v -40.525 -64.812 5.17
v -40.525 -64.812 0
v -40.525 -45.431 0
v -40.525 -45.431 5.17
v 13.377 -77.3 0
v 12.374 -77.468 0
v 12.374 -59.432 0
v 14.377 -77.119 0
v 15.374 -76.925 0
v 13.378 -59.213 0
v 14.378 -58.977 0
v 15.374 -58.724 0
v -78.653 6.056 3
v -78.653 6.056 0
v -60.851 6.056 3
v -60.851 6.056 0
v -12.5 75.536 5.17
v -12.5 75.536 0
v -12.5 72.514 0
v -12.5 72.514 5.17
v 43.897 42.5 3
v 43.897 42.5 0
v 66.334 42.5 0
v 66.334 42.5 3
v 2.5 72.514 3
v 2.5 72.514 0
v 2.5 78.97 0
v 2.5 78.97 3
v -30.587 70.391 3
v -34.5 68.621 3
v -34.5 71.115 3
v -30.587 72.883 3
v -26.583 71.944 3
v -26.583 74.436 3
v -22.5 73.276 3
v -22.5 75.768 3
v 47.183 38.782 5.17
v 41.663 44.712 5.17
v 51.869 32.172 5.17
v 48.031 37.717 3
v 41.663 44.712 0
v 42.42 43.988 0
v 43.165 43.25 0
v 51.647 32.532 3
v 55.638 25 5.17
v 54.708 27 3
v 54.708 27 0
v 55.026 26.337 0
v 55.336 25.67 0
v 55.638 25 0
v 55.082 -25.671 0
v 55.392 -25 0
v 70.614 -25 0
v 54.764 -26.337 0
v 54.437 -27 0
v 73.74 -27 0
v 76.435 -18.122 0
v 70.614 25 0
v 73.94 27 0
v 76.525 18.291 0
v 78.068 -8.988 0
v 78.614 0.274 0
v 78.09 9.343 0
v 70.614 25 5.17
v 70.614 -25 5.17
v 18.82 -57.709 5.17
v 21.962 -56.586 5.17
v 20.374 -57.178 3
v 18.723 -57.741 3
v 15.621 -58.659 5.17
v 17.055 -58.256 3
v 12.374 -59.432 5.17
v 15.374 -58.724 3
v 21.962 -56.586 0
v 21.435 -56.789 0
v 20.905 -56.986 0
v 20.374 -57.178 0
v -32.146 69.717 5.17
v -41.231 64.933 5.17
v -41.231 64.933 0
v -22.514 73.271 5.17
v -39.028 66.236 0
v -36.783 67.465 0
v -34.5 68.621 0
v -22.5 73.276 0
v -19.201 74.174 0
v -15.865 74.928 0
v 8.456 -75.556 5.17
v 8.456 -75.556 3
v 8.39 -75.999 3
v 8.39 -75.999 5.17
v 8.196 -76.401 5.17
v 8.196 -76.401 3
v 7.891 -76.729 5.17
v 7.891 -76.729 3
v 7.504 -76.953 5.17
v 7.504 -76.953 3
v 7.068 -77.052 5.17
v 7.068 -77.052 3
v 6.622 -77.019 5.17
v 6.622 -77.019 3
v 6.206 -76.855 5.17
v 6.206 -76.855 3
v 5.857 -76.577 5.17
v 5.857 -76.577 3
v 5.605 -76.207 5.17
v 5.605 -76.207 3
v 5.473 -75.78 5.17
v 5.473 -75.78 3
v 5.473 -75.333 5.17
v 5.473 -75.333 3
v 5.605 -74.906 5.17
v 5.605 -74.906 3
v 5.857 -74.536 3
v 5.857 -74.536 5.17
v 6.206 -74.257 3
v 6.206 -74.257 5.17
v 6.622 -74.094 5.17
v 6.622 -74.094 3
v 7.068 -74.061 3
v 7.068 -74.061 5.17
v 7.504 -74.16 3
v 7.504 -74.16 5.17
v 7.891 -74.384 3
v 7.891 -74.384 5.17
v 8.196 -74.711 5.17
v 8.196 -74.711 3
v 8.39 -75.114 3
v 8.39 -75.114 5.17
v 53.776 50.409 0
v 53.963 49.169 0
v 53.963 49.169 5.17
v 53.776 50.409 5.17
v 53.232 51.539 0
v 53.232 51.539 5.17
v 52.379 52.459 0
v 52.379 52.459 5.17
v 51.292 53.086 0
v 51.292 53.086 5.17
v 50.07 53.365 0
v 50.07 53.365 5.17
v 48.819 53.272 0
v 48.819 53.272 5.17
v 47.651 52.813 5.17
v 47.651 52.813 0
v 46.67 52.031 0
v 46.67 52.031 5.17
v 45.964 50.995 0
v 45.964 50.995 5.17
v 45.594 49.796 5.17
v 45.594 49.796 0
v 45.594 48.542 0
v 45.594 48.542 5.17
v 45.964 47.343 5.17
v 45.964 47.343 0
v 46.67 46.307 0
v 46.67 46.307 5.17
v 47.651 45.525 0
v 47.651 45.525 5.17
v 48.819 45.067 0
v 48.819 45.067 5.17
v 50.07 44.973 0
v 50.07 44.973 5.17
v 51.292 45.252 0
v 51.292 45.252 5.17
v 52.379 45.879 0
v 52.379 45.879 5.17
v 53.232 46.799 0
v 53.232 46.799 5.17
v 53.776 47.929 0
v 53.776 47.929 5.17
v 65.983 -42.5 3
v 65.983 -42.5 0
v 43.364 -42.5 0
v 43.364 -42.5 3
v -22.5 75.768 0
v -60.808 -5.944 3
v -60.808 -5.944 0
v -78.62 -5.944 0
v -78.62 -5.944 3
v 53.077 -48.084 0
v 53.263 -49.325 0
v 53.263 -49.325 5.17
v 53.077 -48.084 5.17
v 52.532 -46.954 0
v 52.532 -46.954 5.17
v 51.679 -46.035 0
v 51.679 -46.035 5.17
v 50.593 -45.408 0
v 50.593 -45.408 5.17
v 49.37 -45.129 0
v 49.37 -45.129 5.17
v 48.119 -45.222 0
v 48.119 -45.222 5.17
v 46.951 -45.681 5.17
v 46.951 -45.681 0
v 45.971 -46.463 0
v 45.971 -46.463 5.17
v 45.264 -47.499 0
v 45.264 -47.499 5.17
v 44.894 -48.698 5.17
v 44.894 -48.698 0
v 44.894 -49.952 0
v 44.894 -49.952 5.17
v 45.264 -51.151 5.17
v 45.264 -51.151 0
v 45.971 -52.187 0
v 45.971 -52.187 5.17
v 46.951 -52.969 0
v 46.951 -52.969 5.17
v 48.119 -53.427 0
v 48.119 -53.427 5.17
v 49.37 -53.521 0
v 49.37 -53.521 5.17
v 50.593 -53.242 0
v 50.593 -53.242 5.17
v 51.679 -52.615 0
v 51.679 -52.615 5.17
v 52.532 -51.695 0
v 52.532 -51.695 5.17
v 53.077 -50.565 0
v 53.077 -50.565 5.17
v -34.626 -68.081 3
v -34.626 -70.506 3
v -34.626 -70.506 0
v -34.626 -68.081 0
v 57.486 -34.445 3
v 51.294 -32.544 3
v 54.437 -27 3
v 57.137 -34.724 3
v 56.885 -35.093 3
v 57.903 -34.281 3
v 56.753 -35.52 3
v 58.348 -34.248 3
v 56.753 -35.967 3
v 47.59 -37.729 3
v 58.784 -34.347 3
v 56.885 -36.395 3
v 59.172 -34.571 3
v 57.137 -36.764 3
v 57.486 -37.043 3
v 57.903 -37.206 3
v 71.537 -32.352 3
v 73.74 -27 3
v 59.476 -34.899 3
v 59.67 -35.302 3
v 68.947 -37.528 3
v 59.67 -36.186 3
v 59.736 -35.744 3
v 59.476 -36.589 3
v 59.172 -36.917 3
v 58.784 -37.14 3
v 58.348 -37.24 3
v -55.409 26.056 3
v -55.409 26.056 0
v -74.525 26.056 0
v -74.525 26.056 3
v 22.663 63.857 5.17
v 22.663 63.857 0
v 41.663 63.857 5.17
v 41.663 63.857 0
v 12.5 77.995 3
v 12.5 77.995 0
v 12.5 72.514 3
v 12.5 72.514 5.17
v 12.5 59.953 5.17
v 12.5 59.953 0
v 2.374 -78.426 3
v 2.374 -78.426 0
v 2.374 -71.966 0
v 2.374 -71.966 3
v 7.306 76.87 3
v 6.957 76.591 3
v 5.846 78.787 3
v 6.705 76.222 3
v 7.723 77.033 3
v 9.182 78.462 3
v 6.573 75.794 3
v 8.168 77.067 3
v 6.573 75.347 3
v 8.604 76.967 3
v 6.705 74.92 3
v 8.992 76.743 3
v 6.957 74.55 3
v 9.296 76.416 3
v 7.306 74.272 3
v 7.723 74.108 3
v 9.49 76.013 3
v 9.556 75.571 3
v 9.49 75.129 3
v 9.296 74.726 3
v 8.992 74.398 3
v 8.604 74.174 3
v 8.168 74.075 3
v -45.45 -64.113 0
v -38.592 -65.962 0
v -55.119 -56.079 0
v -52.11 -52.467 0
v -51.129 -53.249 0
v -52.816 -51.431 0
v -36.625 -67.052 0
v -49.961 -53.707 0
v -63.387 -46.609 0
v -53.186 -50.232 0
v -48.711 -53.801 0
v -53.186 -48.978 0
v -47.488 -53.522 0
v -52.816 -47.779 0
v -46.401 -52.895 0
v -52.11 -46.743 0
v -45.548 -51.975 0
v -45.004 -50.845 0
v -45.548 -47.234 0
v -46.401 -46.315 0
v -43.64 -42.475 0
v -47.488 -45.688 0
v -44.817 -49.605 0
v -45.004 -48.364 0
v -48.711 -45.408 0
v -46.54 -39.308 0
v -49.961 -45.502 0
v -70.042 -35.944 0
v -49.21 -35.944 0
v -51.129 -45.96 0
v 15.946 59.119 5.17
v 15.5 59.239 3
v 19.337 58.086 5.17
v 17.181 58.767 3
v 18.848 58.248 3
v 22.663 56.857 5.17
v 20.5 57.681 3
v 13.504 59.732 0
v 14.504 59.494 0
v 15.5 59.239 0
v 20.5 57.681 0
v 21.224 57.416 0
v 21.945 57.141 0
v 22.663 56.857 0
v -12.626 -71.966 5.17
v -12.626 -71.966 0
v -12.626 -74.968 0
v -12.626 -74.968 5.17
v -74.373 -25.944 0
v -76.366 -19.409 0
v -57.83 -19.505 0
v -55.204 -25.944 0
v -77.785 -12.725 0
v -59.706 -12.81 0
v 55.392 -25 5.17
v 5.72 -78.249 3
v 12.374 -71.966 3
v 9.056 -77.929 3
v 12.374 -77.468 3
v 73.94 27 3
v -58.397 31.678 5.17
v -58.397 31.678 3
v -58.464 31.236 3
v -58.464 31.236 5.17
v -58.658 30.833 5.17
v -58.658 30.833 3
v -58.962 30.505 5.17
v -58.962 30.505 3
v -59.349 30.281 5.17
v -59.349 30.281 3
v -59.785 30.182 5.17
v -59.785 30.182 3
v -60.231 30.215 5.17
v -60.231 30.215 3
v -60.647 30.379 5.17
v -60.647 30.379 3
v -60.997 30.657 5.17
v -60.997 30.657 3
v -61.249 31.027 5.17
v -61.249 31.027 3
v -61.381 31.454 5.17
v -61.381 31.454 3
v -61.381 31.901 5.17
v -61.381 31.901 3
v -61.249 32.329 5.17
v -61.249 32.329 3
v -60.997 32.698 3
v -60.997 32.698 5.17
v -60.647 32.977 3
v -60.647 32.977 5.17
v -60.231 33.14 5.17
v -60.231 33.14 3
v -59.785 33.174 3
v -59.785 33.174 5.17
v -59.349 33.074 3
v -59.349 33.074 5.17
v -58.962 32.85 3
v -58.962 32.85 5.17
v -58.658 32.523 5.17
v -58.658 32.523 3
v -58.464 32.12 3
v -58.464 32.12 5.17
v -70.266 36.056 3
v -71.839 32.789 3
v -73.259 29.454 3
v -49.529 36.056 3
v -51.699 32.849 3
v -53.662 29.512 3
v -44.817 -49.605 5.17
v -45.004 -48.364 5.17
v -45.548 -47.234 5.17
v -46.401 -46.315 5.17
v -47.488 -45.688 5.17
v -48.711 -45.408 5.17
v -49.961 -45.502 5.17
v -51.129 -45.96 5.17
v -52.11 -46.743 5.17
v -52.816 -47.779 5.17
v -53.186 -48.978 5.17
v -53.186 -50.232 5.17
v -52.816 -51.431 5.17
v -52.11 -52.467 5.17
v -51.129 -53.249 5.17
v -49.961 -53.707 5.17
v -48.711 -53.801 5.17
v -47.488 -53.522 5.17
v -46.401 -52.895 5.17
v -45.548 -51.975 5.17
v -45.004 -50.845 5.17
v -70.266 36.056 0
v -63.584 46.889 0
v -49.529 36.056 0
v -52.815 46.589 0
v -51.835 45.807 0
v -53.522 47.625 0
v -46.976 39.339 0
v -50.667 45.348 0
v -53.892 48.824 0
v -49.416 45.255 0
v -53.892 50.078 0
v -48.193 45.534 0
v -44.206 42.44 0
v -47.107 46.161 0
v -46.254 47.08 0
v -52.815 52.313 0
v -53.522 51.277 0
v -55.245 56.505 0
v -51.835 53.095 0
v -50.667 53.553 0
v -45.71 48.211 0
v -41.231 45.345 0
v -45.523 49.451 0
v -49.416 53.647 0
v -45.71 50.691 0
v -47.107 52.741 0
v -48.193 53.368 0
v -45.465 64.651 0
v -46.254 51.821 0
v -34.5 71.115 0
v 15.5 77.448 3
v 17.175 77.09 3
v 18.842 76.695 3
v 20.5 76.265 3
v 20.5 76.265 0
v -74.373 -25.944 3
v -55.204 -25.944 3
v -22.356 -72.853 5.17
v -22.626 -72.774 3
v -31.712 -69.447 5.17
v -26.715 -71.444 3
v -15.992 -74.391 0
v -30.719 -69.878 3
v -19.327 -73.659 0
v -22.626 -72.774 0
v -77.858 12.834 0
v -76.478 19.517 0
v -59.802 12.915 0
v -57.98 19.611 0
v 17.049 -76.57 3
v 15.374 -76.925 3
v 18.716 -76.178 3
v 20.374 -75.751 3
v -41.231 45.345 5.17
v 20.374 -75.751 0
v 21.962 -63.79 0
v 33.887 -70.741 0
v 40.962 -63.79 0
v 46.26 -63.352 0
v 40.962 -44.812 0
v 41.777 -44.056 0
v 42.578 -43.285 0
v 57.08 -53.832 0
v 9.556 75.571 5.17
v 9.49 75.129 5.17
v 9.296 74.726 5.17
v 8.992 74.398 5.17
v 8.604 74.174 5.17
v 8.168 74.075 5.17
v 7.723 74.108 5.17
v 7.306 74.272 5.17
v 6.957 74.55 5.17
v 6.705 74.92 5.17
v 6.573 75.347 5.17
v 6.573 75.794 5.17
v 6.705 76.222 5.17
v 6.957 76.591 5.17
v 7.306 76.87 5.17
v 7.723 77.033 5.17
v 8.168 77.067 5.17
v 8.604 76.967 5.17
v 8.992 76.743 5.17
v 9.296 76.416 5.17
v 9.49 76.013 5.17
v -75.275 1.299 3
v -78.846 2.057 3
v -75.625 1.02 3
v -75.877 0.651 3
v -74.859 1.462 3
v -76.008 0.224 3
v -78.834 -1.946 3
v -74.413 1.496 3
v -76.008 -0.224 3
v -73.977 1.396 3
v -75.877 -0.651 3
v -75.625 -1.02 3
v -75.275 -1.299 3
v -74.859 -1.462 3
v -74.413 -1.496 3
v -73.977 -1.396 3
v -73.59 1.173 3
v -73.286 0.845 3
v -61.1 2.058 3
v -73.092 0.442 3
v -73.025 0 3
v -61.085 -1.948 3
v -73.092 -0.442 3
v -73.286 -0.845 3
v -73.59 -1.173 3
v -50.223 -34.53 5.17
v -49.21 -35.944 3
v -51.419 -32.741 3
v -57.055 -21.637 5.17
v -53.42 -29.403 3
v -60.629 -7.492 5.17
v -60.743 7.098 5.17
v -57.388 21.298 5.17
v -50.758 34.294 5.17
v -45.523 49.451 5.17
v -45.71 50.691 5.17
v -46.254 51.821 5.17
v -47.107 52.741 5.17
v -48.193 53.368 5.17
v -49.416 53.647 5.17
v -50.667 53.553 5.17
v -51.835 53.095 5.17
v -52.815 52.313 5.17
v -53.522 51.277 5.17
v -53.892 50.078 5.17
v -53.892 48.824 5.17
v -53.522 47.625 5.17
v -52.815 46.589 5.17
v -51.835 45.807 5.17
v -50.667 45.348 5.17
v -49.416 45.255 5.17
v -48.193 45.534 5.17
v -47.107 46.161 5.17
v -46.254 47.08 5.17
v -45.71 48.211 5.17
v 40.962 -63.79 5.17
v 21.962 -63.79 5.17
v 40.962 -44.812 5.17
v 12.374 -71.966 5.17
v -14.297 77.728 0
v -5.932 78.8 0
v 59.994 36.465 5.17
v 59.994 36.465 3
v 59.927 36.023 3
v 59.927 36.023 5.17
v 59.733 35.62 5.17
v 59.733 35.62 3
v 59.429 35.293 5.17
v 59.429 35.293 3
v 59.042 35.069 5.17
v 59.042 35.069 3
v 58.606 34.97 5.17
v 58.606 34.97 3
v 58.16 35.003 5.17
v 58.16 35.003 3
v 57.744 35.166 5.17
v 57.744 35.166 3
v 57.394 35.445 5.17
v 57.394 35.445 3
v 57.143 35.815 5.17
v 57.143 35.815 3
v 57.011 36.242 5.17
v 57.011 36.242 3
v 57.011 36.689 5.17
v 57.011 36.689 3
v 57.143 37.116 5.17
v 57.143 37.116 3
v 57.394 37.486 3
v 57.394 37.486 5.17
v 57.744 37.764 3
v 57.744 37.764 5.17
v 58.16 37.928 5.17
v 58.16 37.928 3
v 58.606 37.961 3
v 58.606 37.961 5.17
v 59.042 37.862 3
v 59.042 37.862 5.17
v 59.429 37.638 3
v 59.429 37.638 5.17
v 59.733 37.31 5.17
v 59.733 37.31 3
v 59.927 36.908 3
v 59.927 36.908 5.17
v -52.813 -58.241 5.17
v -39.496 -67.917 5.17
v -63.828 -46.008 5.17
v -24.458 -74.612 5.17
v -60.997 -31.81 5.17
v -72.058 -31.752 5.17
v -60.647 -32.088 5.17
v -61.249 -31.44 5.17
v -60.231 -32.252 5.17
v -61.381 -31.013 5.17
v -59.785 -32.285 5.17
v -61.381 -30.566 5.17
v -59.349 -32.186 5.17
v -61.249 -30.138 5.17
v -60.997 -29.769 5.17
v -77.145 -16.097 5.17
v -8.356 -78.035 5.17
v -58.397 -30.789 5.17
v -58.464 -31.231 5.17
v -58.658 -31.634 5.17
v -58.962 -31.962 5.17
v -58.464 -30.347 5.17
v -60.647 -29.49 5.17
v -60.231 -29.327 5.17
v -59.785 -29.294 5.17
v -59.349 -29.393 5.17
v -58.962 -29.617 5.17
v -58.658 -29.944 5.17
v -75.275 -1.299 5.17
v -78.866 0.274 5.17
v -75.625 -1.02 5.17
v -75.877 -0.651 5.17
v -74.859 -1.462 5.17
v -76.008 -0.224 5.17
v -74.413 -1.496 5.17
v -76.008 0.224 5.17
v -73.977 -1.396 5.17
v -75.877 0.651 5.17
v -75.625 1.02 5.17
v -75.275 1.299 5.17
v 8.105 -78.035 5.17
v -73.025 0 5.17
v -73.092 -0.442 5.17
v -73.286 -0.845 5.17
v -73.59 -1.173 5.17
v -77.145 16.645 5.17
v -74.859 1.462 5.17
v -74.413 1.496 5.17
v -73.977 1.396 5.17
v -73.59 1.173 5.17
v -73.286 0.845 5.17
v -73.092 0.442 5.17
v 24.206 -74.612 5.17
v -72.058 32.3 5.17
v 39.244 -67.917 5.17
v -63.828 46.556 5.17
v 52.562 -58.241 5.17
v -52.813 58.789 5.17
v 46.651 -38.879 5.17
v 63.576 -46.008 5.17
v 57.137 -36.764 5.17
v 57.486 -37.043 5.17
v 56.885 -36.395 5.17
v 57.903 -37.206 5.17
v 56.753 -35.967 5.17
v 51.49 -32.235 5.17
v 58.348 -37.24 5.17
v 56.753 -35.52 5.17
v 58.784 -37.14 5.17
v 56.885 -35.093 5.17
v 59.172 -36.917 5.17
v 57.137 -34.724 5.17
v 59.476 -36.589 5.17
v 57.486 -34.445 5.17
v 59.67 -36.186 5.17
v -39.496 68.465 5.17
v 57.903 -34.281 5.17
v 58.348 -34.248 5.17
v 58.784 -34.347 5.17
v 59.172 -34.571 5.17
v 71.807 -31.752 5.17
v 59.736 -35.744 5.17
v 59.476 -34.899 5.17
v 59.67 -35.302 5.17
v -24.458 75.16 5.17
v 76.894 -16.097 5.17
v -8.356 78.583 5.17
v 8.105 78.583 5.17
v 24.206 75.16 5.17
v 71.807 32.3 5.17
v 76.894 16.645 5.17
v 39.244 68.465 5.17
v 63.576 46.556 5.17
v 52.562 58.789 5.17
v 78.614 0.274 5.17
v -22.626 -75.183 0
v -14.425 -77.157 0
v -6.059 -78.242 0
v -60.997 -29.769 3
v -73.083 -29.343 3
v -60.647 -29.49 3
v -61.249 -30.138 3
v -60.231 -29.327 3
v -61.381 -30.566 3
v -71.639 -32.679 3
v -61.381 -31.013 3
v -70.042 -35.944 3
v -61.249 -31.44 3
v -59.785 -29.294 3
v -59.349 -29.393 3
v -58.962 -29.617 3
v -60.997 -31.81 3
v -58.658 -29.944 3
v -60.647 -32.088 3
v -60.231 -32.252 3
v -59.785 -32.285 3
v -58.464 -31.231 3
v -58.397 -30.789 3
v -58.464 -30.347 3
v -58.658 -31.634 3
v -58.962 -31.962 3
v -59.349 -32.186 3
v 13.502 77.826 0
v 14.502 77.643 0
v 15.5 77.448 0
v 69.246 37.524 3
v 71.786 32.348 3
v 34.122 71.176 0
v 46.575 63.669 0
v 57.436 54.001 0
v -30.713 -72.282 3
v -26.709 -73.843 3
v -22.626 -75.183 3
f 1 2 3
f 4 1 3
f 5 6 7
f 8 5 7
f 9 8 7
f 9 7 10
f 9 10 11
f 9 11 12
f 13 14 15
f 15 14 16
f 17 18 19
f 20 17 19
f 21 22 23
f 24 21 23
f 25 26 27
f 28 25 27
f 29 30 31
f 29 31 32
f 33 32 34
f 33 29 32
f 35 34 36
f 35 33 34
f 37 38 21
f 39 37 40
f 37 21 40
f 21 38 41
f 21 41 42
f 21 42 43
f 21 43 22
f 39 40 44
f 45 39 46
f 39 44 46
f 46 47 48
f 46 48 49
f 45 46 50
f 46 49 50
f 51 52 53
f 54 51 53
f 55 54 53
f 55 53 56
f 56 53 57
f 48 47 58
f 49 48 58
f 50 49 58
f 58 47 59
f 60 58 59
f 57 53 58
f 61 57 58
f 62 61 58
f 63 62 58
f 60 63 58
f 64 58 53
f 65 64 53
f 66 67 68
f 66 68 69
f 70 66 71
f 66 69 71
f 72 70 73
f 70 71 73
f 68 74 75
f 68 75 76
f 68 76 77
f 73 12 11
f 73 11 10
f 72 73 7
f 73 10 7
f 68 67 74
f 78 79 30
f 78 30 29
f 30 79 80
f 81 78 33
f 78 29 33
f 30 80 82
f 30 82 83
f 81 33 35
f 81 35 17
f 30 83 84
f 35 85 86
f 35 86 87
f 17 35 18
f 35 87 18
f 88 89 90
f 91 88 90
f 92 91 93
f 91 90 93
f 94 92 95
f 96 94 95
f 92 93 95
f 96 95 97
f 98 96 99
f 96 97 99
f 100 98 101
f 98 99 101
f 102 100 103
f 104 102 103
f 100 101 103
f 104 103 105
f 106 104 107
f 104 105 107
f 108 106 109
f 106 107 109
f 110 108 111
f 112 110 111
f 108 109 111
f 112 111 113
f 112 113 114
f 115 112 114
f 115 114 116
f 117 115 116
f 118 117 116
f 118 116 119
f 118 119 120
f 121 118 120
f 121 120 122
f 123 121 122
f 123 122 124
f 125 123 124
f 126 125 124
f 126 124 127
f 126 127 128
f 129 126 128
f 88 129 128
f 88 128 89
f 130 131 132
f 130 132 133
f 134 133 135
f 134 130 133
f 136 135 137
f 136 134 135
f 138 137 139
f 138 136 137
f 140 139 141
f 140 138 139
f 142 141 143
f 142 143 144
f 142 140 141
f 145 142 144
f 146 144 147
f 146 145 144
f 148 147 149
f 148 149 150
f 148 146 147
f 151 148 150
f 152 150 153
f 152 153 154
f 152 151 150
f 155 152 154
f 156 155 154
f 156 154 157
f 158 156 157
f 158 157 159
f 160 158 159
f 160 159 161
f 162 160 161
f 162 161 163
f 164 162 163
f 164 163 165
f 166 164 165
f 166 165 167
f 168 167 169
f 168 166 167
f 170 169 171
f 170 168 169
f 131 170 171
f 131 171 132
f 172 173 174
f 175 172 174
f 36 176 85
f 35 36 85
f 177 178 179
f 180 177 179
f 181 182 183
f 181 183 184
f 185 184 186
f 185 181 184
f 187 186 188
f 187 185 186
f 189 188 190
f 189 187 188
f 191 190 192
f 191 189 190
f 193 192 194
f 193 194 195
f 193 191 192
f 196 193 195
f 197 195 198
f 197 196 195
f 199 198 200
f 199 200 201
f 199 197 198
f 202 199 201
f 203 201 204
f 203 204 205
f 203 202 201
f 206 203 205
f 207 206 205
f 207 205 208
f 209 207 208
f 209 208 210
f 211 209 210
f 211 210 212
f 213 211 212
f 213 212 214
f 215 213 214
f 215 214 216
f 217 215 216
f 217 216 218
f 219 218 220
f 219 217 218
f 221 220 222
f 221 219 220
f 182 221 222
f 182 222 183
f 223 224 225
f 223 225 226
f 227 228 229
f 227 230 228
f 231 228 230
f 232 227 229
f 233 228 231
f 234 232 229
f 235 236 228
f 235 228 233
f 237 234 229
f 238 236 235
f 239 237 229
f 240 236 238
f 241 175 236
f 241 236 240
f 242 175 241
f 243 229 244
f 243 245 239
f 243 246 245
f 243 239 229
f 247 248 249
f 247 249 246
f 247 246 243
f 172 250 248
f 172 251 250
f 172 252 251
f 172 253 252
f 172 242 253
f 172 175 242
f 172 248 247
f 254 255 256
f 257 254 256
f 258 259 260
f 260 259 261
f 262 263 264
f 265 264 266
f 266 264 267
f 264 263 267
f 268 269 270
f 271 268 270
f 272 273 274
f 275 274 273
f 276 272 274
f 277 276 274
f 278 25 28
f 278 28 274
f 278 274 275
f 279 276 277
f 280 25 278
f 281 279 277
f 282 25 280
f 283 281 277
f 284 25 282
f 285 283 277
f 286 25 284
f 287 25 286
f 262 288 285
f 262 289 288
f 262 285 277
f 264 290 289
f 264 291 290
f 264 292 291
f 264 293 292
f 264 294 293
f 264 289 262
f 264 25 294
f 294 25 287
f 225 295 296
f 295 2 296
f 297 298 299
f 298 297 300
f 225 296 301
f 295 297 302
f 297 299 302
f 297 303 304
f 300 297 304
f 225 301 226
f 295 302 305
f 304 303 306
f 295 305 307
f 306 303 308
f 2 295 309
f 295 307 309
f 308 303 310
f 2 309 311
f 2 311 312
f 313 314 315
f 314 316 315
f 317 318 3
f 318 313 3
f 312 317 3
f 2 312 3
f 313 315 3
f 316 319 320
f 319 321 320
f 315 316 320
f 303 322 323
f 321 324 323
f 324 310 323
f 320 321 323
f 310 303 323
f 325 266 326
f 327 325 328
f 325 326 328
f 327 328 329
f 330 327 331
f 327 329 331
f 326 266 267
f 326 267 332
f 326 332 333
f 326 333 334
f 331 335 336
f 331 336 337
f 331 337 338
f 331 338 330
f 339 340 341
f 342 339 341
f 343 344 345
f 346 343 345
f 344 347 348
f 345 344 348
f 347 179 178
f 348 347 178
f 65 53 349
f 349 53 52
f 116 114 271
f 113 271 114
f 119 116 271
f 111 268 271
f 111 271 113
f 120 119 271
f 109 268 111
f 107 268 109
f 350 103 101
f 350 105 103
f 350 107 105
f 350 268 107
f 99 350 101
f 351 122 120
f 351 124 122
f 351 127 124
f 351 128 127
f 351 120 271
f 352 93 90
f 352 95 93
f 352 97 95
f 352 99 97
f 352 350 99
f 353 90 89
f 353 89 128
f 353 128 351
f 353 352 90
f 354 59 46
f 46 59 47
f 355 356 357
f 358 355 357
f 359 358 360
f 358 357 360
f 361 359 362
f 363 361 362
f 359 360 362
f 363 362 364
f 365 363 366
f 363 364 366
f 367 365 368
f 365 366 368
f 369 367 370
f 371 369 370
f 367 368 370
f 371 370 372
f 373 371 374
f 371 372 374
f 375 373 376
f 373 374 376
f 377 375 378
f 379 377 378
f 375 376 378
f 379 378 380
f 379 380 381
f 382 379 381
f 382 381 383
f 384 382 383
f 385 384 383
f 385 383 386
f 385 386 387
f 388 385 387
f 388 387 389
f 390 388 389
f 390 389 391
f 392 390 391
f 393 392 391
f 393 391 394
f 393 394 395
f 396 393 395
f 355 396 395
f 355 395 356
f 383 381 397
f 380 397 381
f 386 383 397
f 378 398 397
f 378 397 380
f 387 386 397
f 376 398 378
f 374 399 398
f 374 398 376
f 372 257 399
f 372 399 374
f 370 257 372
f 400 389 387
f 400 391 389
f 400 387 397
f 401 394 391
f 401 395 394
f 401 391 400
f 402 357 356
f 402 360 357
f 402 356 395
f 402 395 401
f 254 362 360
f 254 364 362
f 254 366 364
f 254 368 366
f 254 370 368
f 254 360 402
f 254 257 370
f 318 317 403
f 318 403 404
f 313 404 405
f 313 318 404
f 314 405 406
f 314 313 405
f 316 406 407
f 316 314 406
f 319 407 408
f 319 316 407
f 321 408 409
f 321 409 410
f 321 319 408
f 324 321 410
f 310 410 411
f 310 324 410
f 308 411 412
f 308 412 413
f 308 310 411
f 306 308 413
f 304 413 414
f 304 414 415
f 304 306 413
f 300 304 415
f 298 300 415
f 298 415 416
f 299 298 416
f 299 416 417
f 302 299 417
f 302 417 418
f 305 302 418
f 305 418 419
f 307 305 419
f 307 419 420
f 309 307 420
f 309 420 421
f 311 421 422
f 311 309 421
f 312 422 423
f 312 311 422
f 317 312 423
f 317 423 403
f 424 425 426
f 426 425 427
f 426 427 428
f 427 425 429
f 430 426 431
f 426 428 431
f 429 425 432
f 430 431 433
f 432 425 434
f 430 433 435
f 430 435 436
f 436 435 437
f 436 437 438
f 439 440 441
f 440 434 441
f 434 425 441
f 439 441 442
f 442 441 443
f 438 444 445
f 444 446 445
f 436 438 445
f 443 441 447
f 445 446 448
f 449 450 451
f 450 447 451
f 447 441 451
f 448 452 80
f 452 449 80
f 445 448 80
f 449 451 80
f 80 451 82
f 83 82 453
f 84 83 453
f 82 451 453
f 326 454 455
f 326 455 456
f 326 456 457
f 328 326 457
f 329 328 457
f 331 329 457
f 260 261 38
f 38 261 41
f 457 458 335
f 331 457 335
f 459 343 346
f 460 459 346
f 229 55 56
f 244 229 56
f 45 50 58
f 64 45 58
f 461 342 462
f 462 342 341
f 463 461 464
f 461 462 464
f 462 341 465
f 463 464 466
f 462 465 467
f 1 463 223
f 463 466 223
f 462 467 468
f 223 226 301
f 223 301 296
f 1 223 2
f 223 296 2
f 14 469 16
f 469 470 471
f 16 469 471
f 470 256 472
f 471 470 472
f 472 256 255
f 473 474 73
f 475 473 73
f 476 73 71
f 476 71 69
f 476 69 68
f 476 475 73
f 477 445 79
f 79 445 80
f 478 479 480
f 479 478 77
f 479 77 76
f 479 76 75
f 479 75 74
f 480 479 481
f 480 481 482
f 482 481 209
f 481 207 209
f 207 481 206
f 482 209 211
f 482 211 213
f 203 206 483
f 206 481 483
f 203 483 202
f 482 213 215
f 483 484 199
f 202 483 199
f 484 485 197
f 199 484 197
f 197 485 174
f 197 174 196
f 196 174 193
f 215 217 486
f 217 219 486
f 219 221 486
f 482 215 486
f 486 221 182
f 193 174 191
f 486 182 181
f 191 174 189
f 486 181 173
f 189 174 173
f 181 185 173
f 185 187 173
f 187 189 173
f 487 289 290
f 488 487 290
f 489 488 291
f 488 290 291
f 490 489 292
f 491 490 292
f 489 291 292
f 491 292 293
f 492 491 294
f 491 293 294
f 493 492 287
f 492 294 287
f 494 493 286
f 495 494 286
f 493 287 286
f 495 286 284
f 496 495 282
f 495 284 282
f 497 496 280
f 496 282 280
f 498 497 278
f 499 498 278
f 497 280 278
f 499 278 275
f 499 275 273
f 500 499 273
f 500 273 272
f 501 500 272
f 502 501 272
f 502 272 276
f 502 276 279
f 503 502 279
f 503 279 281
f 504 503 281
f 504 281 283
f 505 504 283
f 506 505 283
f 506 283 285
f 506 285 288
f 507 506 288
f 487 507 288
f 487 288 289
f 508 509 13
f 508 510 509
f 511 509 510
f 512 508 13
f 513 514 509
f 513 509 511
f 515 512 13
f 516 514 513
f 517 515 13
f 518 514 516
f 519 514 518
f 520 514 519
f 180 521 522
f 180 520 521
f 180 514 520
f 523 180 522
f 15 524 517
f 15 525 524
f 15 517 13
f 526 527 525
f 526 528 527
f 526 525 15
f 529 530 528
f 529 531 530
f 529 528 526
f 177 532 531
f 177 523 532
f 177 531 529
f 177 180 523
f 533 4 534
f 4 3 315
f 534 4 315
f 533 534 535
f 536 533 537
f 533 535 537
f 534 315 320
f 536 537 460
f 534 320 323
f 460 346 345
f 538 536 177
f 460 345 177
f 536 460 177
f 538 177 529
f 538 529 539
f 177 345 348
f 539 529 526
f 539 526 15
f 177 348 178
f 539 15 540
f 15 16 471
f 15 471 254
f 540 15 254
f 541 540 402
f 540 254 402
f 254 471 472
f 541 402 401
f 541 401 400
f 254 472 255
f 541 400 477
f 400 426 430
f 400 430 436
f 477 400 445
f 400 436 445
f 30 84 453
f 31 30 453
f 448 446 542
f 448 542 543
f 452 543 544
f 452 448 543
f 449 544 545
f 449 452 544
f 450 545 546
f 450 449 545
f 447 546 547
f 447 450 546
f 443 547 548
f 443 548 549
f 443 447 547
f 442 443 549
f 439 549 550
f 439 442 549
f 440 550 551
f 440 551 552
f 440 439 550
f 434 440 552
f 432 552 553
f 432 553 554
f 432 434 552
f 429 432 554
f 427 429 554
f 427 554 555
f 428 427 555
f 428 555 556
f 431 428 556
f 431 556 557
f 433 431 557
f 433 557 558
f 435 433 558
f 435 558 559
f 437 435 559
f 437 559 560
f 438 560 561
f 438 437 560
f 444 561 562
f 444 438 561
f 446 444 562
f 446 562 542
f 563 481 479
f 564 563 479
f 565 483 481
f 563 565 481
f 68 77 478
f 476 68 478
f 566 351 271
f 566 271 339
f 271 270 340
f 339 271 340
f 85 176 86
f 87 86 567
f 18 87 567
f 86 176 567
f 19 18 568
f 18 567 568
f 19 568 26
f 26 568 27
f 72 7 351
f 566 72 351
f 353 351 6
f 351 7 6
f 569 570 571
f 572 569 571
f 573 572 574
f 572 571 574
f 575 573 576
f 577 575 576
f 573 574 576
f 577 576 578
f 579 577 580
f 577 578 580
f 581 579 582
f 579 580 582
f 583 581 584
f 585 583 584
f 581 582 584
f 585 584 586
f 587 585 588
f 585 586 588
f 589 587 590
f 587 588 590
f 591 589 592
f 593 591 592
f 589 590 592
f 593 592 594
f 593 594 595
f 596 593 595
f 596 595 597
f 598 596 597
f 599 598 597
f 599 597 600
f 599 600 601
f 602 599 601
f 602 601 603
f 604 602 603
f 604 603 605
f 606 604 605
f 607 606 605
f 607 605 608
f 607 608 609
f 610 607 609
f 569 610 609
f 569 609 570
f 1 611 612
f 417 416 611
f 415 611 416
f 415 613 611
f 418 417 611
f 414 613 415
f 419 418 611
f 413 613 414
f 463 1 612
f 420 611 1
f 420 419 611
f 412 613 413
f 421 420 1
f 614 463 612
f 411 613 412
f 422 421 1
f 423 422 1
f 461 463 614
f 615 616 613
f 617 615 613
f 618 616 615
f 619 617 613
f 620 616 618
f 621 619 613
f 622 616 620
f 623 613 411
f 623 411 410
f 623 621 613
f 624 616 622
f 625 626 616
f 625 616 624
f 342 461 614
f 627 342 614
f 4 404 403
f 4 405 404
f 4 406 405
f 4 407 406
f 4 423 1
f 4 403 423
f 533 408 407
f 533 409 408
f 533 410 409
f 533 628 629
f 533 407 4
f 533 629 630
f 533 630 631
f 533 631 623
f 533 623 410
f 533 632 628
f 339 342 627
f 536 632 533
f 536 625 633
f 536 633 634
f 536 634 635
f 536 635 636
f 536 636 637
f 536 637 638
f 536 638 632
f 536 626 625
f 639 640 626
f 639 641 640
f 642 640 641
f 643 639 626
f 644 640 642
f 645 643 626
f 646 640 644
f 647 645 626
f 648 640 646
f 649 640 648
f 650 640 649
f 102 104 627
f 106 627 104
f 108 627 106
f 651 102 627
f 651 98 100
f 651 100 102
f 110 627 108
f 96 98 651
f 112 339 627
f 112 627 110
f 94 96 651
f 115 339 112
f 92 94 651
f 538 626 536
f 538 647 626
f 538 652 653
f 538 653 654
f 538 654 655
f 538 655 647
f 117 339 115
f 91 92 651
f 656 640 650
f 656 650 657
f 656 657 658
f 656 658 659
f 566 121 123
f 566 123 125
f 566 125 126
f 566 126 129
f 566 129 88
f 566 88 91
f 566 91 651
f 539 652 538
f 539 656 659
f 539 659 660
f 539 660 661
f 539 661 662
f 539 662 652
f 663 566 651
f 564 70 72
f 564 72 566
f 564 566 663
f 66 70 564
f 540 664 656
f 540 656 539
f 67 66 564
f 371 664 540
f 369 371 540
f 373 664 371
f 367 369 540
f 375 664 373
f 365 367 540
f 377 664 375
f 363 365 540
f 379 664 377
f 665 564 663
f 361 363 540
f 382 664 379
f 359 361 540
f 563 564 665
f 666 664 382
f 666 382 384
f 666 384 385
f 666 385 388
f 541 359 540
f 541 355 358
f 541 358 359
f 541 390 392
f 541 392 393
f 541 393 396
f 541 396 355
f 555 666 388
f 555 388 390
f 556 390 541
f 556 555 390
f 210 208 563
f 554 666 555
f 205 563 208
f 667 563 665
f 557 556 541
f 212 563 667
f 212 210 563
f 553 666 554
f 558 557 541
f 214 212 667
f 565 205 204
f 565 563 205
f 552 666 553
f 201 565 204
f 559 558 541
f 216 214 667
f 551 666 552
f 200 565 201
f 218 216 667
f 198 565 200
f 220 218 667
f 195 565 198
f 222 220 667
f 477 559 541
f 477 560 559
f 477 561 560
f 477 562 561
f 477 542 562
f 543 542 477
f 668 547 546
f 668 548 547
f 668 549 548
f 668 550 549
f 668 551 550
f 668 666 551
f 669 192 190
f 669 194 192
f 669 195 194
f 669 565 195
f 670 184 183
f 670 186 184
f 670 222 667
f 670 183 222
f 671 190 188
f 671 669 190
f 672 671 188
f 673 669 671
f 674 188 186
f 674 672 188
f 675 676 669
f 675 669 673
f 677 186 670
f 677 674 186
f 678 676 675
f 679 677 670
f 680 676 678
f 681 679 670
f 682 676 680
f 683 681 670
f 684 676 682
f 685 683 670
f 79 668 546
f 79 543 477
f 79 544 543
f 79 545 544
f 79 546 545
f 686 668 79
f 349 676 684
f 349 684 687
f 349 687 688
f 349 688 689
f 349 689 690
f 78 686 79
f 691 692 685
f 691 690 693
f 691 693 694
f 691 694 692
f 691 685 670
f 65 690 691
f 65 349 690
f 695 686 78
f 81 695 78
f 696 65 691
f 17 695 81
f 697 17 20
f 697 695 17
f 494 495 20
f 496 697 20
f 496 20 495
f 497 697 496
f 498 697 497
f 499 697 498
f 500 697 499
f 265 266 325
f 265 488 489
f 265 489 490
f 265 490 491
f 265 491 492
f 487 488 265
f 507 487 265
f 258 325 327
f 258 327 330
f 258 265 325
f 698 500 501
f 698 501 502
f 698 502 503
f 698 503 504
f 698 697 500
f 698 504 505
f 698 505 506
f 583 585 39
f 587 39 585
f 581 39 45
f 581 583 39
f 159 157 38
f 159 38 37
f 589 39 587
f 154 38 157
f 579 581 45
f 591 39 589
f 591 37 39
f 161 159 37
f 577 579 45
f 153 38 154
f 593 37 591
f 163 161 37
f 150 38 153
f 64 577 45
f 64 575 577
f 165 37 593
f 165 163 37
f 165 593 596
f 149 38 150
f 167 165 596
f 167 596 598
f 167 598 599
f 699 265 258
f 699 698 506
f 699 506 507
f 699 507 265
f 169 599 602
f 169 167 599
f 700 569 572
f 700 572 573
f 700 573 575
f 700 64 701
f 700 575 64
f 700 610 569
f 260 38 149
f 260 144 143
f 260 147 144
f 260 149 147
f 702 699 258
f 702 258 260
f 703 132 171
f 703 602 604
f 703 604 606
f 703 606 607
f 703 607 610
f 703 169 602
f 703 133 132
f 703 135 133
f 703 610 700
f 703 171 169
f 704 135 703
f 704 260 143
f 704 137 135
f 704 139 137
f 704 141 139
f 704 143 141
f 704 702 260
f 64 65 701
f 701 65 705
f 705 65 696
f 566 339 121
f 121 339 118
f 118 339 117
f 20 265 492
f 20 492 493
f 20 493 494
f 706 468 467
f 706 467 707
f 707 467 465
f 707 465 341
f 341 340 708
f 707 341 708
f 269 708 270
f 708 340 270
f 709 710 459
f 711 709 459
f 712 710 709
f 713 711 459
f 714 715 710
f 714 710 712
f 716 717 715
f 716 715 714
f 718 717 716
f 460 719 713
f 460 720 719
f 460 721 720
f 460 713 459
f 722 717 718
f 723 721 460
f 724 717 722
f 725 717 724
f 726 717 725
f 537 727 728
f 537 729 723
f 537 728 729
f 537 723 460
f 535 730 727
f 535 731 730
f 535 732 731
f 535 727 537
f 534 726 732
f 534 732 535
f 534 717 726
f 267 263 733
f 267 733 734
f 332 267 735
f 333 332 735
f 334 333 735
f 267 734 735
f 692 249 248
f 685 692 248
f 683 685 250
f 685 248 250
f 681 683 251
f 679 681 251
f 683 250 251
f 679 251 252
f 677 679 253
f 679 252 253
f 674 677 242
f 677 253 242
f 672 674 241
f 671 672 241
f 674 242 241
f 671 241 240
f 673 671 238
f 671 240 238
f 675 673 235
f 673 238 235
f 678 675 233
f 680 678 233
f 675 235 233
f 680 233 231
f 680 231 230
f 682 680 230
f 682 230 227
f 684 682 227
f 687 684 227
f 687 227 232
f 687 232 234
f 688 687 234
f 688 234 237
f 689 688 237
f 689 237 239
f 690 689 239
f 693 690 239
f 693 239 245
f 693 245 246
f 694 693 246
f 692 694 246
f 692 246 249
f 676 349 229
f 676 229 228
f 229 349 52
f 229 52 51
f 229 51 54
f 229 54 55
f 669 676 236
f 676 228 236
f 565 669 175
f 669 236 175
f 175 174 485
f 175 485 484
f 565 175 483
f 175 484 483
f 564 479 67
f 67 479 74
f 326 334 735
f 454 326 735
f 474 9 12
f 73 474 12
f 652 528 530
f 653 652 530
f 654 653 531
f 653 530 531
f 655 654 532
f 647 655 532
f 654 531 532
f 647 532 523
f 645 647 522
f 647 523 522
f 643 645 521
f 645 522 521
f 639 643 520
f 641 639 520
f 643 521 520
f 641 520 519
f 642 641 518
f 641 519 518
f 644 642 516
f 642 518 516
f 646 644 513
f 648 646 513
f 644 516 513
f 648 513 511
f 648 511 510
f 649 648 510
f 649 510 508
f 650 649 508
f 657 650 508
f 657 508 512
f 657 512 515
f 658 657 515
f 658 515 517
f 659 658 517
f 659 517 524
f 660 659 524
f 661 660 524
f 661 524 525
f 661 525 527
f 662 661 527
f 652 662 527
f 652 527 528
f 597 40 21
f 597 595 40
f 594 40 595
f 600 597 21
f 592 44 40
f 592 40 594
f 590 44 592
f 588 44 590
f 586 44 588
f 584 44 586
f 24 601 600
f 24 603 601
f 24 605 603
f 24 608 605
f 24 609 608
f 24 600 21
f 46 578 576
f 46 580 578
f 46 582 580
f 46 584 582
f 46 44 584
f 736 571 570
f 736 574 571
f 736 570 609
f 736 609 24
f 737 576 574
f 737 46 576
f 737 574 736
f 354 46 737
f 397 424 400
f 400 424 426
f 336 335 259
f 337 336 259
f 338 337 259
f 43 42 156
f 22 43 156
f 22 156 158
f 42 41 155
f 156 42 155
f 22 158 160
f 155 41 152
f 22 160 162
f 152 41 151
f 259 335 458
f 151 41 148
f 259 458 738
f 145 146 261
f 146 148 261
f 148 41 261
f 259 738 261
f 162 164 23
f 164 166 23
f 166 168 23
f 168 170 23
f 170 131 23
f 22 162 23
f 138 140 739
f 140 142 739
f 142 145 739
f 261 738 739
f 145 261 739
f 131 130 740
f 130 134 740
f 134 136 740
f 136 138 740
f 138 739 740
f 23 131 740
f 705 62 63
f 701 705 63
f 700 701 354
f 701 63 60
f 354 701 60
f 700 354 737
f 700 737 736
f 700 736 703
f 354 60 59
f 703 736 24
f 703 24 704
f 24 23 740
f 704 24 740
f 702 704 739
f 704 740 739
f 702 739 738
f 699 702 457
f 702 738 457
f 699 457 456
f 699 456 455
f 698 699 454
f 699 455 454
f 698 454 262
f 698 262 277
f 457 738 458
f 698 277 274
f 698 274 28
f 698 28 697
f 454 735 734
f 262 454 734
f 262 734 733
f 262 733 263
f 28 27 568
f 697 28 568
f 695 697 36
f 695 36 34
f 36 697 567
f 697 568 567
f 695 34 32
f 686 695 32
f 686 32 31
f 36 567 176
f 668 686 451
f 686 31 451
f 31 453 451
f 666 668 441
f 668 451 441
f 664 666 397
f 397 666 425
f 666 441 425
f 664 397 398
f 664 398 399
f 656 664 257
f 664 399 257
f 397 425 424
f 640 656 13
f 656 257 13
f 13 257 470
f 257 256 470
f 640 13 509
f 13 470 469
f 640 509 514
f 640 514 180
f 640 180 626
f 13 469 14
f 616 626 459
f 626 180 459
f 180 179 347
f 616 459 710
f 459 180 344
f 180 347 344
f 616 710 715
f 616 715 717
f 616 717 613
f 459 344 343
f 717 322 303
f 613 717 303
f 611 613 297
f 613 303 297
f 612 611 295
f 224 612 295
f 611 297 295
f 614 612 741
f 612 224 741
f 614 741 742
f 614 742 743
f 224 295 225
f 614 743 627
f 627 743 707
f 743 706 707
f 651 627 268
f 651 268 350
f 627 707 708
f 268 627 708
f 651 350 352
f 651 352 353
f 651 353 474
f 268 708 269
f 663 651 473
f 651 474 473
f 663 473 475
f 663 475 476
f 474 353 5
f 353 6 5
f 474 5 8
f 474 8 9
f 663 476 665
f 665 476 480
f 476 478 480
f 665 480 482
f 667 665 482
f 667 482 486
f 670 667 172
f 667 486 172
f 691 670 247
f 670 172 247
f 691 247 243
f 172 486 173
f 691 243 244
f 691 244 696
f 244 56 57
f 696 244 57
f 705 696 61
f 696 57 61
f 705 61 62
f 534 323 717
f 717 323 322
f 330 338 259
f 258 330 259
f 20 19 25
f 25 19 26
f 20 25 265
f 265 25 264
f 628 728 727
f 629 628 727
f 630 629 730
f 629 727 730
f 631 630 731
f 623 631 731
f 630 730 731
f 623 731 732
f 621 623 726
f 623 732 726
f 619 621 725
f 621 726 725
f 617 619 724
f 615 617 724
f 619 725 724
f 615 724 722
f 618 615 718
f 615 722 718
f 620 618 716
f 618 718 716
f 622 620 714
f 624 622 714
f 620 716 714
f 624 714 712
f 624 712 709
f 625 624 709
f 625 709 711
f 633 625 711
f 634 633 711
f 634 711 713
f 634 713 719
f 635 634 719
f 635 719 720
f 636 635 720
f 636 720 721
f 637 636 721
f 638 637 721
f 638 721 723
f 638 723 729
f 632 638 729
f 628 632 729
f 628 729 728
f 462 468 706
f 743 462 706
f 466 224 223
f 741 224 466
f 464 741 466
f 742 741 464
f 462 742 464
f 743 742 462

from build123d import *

# Parameters (mm, degrees)
F0_R     = 78.74
F0_R_2   = 4.208
F0_R_3   = 4.2080161266
F1_DEPTH = 5.17
F3_DEPTH = 3
F4_R     = 1.5
F5_DEPTH = 25


# Not quite as in the source:
# - a feature names something its author has since deleted; it is built from what else it names


with BuildPart() as f1:
    # F0 (on Top) → F1 (new body)
    with BuildSketch(Plane.XY):
        with Locations((-0.1257307514, 0.2739626218)):
            Circle(F0_R)
        with Locations((-49.0250116127, -49.6047185081)):
            Circle(F0_R_2, mode=Mode.SUBTRACT)
        with Locations((49.0554707364, -49.3247707953)):
            Circle(F0_R_3, mode=Mode.SUBTRACT)
        with Locations((-49.7306512766, 49.450932452)):
            Circle(F0_R_2, mode=Mode.SUBTRACT)
        with BuildLine():
            ThreePointArc((41.6625381497, 44.7120159348), (49.6362217188, 35.5549502263), (55.6382636856, 25))
            Line((55.6382636856, 25), (70.6142692486, 25))
            Line((70.6142692486, 25), (70.6142692486, -25))
            Line((70.6142692486, -25), (55.3920755218, -25))
            ThreePointArc((55.3920755218, -25), (49.182592498, -35.6382812281), (40.9624707364, -44.8121738117))
            Line((40.9624707364, -44.8121738117), (40.9624707364, -63.790228106))
            Line((40.9624707364, -63.790228106), (21.9624707364, -63.790228106))
            Line((21.9624707364, -63.790228106), (21.9624707364, -56.5864924857))
            ThreePointArc((21.9624707364, -56.5864924857), (17.2267771251, -58.2058669812), (12.3742692486, -59.4315647605))
            Line((12.3742692486, -59.4315647605), (12.3742692486, -71.9660373782))
            Line((12.3742692486, -71.9660373782), (-12.6257307514, -71.9660373782))
            Line((-12.6257307514, -71.9660373782), (-12.6257307514, -74.9675166541))
            ThreePointArc((-12.6257307514, -74.9675166541), (-27.09160778, -71.308076376), (-40.5250116127, -64.8121728344))
            Line((-40.5250116127, -64.8121728344), (-40.5250116127, -45.4305022137))
            ThreePointArc((-40.5250116127, -45.4305022137), (-61.1238878157, -0.2002048119), (-41.2306512766, 45.3448568731))
            Line((-41.2306512766, 45.3448568731), (-41.2306512766, 64.9332740284))
            ThreePointArc((-41.2306512766, 64.9332740284), (-27.3884909599, 71.6521165865), (-12.5, 75.5355537871))
            Line((-12.5, 75.5355537871), (-12.5, 72.5138622393))
            Line((-12.5, 72.5138622393), (0, 72.5138622393))
            Line((0, 72.5138622393), (12.5, 72.5138622393))
            Line((12.5, 72.5138622393), (12.5, 59.9530286583))
            ThreePointArc((12.5, 59.9530286583), (17.6487859305, 58.6269107626), (22.6625381497, 56.8574831953))
            Line((22.6625381497, 56.8574831953), (22.6625381497, 63.8574831953))
            Line((22.6625381497, 63.8574831953), (41.6625381497, 63.8574831953))
            Line((41.6625381497, 63.8574831953), (41.6625381497, 44.7120159348))
        make_face(mode=Mode.SUBTRACT)
        with Locations((49.75511293, 49.1690173001)):
            Circle(F0_R_2, mode=Mode.SUBTRACT)
    extrude(amount=F1_DEPTH)

    # F2 (on face) → F3 (cut)
    with BuildSketch(Plane(origin=(0, 0, 0), x_dir=(1, 0, 0), z_dir=(0, 0, -1))):
        with BuildLine():
            ThreePointArc((-22.6257307514, 75.1828965761), (-28.7215245435, 73.0899806842), (-34.6257307514, 70.5055372352))
            Line((-34.6257307514, 70.5055372352), (-34.6257307514, 68.081065471))
            ThreePointArc((-34.6257307514, 68.081065471), (-28.7284061022, 70.69020135), (-22.6257307514, 72.7742794712))
            Line((-22.6257307514, 72.7742794712), (-22.6257307514, 75.1828965761))
        make_face()
        with BuildLine():
            Line((-34.5, -68.6212157755), (-34.5, -71.1146092424))
            ThreePointArc((-34.5, -71.1146092424), (-28.5952430236, -73.6870028189), (-22.5, -75.7681986639))
            Line((-22.5, -75.7681986639), (-22.5, -73.2755617719))
            ThreePointArc((-22.5, -73.2755617719), (-28.595756362, -71.1952712241), (-34.5, -68.6212157755))
        make_face()
        with BuildLine():
            ThreePointArc((-49.5286609465, -36.0559481471), (-52.707319331, -31.1960670528), (-55.4094464584, -26.0559481471))
            Line((-55.4094464584, -26.0559481471), (-74.5251717599, -26.0559481471))
            ThreePointArc((-74.5251717599, -26.0559481471), (-72.5682702123, -31.1295306193), (-70.2658555864, -36.0559481471))
            Line((-70.2658555864, -36.0559481471), (-49.5286609465, -36.0559481471))
        make_face()
        with BuildLine():
            ThreePointArc((-60.8510849569, -6.0559481471), (-61.1253373513, -0.0548857934), (-60.807987598, 5.9440518529))
            Line((-60.807987598, 5.9440518529), (-78.6198317781, 5.9440518529))
            ThreePointArc((-78.6198317781, 5.9440518529), (-78.86542717, -0.0553124259), (-78.6531542631, -6.0559481471))
            Line((-78.6531542631, -6.0559481471), (-60.8510849569, -6.0559481471))
        make_face()
        with BuildLine():
            ThreePointArc((-55.2039997602, 25.9440518529), (-52.4464078958, 31.0875861785), (-49.2098975215, 35.9440518529))
            Line((-49.2098975215, 35.9440518529), (-70.0417019419, 35.9440518529))
            ThreePointArc((-70.0417019419, 35.9440518529), (-72.3803771023, 31.0190666452), (-74.3726385456, 25.9440518529))
            Line((-74.3726385456, 25.9440518529), (-55.2039997602, 25.9440518529))
        make_face()
        with BuildLine():
            Line((2.5, -72.5138622393), (2.5, -78.9701705229))
            ThreePointArc((2.5, -78.9701705229), (7.5155682015, -78.6423117834), (12.5, -77.9951214075))
            Line((12.5, -77.9951214075), (12.5, -72.5138622393))
            Line((12.5, -72.5138622393), (2.5, -72.5138622393))
        make_face()
        with BuildLine():
            ThreePointArc((12.3742692486, 77.4675166541), (7.3895759923, 78.1065691737), (2.3742692486, 78.4263397919))
            Line((2.3742692486, 78.4263397919), (2.3742692486, 71.9660373782))
            Line((2.3742692486, 71.9660373782), (12.3742692486, 71.9660373782))
            Line((12.3742692486, 71.9660373782), (12.3742692486, 77.4675166541))
        make_face()
        with BuildLine():
            ThreePointArc((20.3742692486, 75.7506228753), (17.8838503139, 76.3787776414), (15.3742692486, 76.9253741629))
            Line((15.3742692486, 76.9253741629), (15.3742692486, 58.7239186961))
            ThreePointArc((15.3742692486, 58.7239186961), (17.8908537815, 58.0047014138), (20.3742692486, 57.1781913848))
            Line((20.3742692486, 57.1781913848), (20.3742692486, 75.7506228753))
        make_face()
        with BuildLine():
            Line((15.5, -59.238668493), (15.5, -77.4479487731))
            ThreePointArc((15.5, -77.4479487731), (18.0096554679, -76.8970359527), (20.5, -76.2645332932))
            Line((20.5, -76.2645332932), (20.5, -57.6810983365))
            ThreePointArc((20.5, -57.6810983365), (18.0167228167, -58.5135658015), (15.5, -59.238668493))
        make_face()
        with BuildLine():
            ThreePointArc((66.3344029178, -42.5), (70.5632346959, -34.9590857149), (73.9398248467, -27))
            Line((73.9398248467, -27), (54.7078258181, -27))
            ThreePointArc((54.7078258181, -27), (49.9060787318, -35.1712123678), (43.8965564147, -42.5))
            Line((43.8965564147, -42.5), (66.3344029178, -42.5))
        make_face()
        with BuildLine():
            ThreePointArc((73.7398130624, 27), (70.2892388263, 34.9640801641), (65.9830865246, 42.5))
            Line((65.9830865246, 42.5), (43.3643614724, 42.5))
            ThreePointArc((43.3643614724, 42.5), (49.5096317795, 35.1848978566), (54.4373608299, 27))
            Line((54.4373608299, 27), (73.7398130624, 27))
        make_face()
    extrude(amount=-F3_DEPTH, mode=Mode.SUBTRACT)

    # F4 (on face) → F5 (cut)
    with BuildSketch(Plane(origin=(0, 0, 3), x_dir=(1, 0, 0), z_dir=(0, 0, -1))):
        with Locations((-74.5251700282, 0)):
            Circle(F4_R)
        with Locations((-59.8972582664, 30.7893175632)):
            Circle(F4_R)
        with Locations((-59.8972582664, -31.6777378321)):
            Circle(F4_R)
        with Locations((8.0563814701, -75.5707131466)):
            Circle(F4_R)
        with Locations((6.9561954952, 75.5563961955)):
            Circle(F4_R)
        with Locations((58.2362919726, 35.7437855263)):
            Circle(F4_R)
        with Locations((58.4940314293, -36.4654541612)):
            Circle(F4_R)
    extrude(amount=-F5_DEPTH, mode=Mode.SUBTRACT)


solid = f1.part
